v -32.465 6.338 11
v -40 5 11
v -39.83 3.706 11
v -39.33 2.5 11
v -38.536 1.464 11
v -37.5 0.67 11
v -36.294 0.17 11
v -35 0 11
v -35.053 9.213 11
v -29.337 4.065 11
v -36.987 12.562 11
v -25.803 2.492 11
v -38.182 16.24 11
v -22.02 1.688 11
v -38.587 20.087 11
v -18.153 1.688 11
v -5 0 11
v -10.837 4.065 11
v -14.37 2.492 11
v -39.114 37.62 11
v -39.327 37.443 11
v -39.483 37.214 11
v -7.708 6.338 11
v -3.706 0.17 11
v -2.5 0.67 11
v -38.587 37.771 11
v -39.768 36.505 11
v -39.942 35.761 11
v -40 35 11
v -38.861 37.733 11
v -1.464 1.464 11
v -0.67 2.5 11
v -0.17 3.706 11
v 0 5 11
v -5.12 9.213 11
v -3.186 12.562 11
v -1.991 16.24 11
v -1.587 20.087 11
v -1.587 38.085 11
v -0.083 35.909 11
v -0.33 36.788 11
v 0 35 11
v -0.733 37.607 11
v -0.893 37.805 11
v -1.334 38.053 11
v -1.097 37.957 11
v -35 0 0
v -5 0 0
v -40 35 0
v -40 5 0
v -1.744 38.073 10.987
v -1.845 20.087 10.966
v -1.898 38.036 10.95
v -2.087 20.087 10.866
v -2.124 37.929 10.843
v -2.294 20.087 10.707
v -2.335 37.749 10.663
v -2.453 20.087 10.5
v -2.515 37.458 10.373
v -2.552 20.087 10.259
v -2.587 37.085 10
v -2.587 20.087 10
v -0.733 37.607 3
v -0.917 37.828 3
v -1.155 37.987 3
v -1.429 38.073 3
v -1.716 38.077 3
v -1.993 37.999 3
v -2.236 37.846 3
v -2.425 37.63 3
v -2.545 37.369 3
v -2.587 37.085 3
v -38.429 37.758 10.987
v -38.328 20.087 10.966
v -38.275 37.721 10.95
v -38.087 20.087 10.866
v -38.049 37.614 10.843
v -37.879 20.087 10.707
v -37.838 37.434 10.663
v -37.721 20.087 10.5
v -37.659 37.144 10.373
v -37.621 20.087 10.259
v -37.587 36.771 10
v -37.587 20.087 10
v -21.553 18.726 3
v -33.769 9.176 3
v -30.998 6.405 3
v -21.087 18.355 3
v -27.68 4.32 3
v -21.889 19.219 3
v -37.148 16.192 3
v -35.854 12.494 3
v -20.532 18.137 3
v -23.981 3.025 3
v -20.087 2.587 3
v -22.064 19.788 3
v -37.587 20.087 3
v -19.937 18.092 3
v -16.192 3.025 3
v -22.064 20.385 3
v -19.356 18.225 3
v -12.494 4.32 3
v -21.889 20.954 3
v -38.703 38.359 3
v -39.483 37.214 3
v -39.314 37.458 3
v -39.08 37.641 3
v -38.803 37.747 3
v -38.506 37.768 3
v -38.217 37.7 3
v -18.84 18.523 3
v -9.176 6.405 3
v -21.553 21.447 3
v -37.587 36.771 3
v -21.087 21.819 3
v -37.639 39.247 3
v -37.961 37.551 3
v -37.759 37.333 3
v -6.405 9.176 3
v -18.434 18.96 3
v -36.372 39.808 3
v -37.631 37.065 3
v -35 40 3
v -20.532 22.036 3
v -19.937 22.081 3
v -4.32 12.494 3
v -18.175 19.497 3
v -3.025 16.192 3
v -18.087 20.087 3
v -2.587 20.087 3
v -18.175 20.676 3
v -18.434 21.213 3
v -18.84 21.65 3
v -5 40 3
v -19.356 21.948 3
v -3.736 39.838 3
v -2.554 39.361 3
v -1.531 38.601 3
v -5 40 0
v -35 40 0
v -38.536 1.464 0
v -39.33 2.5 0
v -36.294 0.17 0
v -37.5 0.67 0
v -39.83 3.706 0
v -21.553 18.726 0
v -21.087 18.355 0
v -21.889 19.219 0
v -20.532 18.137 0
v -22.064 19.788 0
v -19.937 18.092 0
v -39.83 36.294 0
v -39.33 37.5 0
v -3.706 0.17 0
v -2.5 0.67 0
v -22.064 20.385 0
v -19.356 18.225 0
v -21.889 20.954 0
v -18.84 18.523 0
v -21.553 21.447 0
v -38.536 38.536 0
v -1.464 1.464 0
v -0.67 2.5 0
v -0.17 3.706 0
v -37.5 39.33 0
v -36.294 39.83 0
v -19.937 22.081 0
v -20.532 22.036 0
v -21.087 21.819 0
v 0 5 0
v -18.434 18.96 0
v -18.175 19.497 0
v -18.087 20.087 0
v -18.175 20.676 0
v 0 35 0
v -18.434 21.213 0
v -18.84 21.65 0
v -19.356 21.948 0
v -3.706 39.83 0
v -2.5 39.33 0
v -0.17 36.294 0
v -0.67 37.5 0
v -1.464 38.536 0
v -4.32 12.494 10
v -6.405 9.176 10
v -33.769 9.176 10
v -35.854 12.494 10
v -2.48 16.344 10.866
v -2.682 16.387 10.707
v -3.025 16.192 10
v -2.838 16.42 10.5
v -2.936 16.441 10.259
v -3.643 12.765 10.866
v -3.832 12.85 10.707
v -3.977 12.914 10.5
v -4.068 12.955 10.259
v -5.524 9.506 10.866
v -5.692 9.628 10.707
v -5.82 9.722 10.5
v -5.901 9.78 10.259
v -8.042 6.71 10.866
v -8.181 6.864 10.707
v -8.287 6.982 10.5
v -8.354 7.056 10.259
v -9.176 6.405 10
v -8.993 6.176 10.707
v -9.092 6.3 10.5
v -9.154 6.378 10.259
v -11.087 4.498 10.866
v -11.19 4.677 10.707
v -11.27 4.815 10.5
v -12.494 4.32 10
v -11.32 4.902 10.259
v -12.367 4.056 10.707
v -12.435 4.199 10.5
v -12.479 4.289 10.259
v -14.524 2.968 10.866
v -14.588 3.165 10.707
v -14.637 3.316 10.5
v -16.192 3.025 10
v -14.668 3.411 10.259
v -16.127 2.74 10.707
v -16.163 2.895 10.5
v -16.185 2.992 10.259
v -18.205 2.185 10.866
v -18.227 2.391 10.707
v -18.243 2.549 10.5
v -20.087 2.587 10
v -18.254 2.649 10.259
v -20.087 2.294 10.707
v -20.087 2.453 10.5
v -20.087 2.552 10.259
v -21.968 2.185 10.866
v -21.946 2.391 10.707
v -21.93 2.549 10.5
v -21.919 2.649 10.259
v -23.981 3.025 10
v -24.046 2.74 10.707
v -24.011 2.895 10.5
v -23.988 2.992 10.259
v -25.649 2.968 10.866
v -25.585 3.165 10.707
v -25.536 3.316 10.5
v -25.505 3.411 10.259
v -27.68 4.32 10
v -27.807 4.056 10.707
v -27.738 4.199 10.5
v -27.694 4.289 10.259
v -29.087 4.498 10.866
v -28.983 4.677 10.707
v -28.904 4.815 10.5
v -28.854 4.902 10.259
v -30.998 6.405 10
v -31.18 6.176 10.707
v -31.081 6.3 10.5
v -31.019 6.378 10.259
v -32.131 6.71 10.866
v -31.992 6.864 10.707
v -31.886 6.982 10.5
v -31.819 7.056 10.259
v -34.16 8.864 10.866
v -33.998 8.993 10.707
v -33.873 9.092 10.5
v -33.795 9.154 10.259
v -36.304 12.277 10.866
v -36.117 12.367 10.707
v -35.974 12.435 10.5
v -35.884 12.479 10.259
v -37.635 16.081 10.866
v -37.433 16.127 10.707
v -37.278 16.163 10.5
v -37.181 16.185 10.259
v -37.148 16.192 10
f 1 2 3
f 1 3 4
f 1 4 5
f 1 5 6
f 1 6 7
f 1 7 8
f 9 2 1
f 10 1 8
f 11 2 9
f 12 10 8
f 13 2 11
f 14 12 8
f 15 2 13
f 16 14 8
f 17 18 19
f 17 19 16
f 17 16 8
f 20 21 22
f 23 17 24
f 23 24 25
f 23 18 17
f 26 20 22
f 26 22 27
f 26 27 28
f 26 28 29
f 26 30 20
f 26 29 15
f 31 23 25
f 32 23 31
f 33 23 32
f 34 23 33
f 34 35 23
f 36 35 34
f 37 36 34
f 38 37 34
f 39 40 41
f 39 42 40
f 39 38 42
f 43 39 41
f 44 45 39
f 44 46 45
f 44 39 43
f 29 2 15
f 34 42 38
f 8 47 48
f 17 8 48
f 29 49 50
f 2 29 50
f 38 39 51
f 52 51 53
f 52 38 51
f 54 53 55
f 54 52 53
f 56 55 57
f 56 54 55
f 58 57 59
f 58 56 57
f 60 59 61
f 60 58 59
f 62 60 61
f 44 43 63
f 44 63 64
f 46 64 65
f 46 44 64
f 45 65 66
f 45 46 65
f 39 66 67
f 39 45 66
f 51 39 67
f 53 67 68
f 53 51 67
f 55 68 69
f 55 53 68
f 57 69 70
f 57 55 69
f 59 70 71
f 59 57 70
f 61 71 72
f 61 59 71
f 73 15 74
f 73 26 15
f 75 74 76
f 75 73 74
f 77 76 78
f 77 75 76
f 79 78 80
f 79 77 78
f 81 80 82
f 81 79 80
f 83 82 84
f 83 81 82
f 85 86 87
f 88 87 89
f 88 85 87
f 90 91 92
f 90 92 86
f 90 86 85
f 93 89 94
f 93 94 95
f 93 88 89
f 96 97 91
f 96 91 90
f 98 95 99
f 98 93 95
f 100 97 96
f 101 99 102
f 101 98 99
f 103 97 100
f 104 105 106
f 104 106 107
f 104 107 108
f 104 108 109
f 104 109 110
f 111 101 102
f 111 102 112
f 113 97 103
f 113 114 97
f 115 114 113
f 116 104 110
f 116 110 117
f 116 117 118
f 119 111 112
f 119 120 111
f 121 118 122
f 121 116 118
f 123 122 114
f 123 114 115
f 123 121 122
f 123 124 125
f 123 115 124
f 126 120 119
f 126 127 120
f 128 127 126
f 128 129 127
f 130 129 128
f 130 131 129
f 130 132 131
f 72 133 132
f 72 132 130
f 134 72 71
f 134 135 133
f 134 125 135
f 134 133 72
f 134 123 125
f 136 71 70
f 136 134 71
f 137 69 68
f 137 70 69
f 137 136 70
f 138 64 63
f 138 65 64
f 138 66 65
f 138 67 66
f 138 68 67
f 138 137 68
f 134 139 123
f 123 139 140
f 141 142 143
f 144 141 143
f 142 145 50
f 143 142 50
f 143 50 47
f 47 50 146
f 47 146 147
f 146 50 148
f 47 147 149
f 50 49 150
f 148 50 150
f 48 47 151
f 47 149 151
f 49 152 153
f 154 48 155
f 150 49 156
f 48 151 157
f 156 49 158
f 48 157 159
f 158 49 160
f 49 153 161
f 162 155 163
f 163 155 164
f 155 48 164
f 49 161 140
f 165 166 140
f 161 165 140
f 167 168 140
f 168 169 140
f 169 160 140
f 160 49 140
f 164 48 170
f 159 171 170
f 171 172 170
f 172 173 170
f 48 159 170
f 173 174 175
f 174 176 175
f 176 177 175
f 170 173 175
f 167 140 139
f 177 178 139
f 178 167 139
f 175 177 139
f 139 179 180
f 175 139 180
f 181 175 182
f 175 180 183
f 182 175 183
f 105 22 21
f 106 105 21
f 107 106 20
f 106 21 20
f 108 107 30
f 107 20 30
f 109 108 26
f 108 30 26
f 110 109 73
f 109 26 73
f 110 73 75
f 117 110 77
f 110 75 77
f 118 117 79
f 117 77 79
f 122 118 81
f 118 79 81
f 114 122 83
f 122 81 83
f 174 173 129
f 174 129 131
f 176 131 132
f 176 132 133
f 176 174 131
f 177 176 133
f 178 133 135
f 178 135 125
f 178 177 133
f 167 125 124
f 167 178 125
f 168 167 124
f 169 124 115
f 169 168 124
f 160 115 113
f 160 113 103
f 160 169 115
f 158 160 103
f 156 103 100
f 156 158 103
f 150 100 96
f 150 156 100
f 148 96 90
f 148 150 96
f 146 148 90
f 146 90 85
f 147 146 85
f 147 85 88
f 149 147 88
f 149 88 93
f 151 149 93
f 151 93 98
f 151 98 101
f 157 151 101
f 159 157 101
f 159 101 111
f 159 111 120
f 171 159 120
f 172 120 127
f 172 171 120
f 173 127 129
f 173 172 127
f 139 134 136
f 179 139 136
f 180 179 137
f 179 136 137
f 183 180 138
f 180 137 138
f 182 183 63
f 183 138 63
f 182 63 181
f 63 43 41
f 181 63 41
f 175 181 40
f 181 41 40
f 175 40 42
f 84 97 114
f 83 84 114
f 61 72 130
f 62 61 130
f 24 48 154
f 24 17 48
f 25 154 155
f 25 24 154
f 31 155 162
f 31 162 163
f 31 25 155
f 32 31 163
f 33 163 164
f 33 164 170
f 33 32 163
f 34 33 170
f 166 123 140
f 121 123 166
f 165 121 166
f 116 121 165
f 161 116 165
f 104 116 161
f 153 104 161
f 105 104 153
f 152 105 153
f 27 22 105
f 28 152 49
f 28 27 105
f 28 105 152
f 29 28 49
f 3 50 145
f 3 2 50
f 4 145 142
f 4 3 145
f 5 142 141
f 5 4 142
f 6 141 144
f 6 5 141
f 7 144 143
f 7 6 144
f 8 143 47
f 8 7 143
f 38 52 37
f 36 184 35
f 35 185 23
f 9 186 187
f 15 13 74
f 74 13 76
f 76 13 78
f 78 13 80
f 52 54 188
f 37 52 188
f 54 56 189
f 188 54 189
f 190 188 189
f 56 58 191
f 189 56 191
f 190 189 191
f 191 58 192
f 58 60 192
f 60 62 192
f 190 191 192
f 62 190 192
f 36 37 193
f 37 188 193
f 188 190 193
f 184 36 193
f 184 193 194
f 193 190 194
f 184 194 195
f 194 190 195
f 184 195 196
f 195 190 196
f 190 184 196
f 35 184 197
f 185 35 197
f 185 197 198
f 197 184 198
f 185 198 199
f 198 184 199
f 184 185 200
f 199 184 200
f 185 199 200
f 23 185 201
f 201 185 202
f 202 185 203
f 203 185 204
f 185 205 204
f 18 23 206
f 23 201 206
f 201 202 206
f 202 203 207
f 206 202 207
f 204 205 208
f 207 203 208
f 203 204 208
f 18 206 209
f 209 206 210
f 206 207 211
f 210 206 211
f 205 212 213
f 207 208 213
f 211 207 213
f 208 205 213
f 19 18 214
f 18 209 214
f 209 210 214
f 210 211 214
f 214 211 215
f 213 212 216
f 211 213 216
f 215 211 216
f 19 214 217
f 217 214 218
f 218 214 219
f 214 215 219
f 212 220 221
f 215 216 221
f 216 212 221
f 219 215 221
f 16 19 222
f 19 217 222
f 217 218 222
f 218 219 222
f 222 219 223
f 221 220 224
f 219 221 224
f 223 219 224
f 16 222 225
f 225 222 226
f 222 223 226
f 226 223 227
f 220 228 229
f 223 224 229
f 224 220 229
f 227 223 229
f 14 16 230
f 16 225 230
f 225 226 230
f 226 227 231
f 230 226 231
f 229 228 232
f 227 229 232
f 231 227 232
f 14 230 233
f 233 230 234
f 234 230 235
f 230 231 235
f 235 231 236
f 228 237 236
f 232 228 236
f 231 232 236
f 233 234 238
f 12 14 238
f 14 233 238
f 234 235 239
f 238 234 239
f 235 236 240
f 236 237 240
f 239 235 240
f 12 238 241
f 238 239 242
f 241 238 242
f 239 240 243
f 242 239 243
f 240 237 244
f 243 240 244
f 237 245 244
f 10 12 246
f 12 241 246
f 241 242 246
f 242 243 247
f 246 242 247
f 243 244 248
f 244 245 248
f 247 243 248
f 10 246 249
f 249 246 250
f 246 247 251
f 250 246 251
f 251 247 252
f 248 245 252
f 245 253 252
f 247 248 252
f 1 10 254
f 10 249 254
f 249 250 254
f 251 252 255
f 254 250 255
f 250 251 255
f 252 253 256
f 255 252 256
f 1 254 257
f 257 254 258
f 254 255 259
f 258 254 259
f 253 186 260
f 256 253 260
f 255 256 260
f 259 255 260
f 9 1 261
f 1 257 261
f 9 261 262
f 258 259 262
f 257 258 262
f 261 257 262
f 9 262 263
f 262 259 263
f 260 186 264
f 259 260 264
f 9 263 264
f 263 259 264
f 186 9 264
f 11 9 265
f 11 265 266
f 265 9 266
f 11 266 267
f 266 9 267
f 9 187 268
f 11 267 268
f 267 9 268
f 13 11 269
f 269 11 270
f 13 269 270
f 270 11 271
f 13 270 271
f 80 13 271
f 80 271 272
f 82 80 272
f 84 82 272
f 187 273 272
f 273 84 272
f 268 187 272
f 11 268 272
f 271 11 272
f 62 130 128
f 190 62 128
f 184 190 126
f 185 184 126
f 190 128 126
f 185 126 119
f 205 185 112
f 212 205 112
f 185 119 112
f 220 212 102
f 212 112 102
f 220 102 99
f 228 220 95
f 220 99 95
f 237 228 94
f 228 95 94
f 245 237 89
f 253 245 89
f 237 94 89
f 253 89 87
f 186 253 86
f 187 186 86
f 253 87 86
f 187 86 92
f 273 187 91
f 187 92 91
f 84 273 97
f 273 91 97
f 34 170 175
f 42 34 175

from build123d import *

# Parameters (mm, degrees)
F1_DEPTH = 11
F0_R     = 2
F2_DEPTH = 3
F3_R     = 5
F4_R     = 1


with BuildPart() as f1:
    # F0 (on Top) → F1 (new body)
    with BuildSketch(Plane.XY):
        with BuildLine():
            Line((-40, 0), (0, 0))
            Line((0, 0), (0, 40))
            Line((0, 40), (-2.5865715742, 40))
            Line((-2.5865715742, 40), (-2.5865715742, 20.0865715742))
            ThreePointArc((-2.5865715742, 20.0865715742), (-20.0865715742, 2.5865715742), (-37.5865715742, 20.0865715742))
            Line((-37.5865715742, 20.0865715742), (-37.5865715742, 40))
            Line((-37.5865715742, 40), (-40, 40))
            Line((-40, 40), (-40, 0))
        make_face()
    extrude(amount=F1_DEPTH)

    # F0 (on Top) → F2 (join)
    with BuildSketch(Plane.XY):
        with BuildLine():
            Line((-2.5865715742, 20.0865715742), (-2.5865715742, 40))
            Line((-2.5865715742, 40), (-37.5865715742, 40))
            Line((-37.5865715742, 40), (-37.5865715742, 20.0865715742))
            ThreePointArc((-37.5865715742, 20.0865715742), (-20.0865715742, 37.5865715742), (-2.5865715742, 20.0865715742))
        make_face()
        with BuildLine():
            ThreePointArc((-37.5865715742, 20.0865715742), (-20.0865715742, 2.5865715742), (-2.5865715742, 20.0865715742))
            ThreePointArc((-2.5865715742, 20.0865715742), (-20.0865715742, 37.5865715742), (-37.5865715742, 20.0865715742))
        make_face()
        with Locations((-20.0865715742, 20.0865715742)):
            Circle(F0_R, mode=Mode.SUBTRACT)
    extrude(amount=F2_DEPTH)

    # F3
    f3_edges = [f1.edges().sort_by_distance(p)[0] for p in [
        (-40, 0, 5.5),
        (0, 0, 5.5),
        (0, 40, 5.5),
        (-40, 40, 5.5),
    ]]
    fillet(f3_edges, radius=F3_R)

    # F4
    f4_edges = [f1.edges().sort_by_distance(p)[0] for p in [
        (-20.086572, 2.586572, 11),
        (-37.586572, 29.682774, 11),
        (-2.586572, 39.378968, 7),
        (-37.586572, 39.278977, 7),
    ]]
    fillet(f4_edges, radius=F4_R)


solid = f1.part
